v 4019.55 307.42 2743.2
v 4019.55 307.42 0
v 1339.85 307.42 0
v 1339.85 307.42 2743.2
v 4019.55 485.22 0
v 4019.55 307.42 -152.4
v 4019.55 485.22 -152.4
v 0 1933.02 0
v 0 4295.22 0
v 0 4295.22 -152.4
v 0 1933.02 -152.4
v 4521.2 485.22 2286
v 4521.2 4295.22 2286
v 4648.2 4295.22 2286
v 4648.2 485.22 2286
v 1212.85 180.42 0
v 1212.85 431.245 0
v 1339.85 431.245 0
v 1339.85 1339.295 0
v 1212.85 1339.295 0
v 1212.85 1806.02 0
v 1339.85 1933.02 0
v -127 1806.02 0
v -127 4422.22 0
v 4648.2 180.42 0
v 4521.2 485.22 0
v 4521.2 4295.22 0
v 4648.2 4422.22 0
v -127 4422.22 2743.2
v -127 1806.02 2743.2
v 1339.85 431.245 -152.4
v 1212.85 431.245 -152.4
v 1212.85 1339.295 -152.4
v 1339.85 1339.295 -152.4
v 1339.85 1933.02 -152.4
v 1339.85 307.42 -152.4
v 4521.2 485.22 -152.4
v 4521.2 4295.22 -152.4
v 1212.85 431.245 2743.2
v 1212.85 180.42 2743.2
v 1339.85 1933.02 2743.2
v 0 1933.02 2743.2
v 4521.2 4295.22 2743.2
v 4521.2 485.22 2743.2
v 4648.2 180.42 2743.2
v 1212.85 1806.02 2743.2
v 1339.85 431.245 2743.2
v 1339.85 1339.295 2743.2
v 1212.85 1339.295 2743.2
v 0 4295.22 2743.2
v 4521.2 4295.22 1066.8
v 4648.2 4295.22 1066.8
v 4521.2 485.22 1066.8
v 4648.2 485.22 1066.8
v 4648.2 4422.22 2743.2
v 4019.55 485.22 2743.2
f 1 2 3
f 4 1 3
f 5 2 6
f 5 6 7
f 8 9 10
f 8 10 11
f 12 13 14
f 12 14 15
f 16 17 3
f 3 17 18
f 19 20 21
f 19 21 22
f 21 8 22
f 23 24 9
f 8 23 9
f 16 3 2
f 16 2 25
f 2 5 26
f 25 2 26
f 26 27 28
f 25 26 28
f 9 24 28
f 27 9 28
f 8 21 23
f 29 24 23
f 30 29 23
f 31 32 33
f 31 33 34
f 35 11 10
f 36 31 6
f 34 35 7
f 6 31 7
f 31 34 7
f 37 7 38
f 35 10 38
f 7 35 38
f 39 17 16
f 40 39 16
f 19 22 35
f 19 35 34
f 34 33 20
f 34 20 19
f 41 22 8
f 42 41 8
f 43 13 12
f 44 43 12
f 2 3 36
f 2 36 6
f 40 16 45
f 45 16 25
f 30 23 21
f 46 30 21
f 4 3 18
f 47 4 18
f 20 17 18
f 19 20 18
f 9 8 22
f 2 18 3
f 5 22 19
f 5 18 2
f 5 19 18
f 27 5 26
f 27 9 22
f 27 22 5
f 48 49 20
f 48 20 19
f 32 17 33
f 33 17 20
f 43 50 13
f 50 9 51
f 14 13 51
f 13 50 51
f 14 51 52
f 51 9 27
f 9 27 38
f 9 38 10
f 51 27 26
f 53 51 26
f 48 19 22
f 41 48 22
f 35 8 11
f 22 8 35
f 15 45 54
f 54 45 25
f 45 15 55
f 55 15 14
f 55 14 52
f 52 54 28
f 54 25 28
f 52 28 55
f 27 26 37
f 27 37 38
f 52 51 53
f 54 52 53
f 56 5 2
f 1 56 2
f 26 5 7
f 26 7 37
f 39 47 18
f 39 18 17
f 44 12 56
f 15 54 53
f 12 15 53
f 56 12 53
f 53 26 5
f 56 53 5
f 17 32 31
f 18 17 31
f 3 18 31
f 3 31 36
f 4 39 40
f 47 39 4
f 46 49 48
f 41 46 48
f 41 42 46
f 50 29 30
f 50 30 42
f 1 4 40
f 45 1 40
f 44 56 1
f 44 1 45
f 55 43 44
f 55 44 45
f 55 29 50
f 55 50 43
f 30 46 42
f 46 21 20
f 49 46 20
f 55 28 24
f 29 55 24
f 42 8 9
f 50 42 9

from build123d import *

# Parameters (mm, degrees)
F1_DEPTH = 2743.2
F2_W     = 3810
F2_H     = 1219.2
F3_DEPTH = 127
F0_W     = 127
F0_H     = 908.05
F4_DEPTH = 152.4


with BuildPart() as f1:
    # F0 (on Top) → F1 (new body)
    with BuildSketch(Plane.XY):
        Polygon((4019.55, 307.420327), (1339.85, 307.420327), (1339.85, 431.245327), (1212.85, 431.245327), (1212.85, 180.420327), (4648.2, 180.420327), (4648.2, 4422.220327), (-127, 4422.220327), (-127, 1806.020327), (1212.85, 1806.020327), (1212.85, 1339.295327), (1339.85, 1339.295327), (1339.85, 1933.020327), (0, 1933.020327), (0, 4295.220327), (4521.2, 4295.220327), (4521.2, 485.220327), (4019.55, 485.220327), align=None)
    extrude(amount=F1_DEPTH)

    # F2 (on face) → F3 (cut, through all)
    with BuildSketch(Plane(origin=(4521.2, 0, 0), x_dir=(0, -1, 0), z_dir=(-1, 0, 0))):
        with Locations((-2390.220327, 1676.4)):
            Rectangle(F2_W, F2_H)
    extrude(amount=-F3_DEPTH, mode=Mode.SUBTRACT)

    # F0 (on Top) → F4 (join)
    with BuildSketch(Plane.XY):
        Polygon((1339.85, 431.245327), (1339.85, 307.420327), (4019.55, 307.420327), (4019.55, 485.220327), (4521.2, 485.220327), (4521.2, 4295.220327), (0, 4295.220327), (0, 1933.020327), (1339.85, 1933.020327), (1339.85, 1339.295327), align=None)
        with Locations((1276.35, 885.270327)):
            Rectangle(F0_W, F0_H)
    extrude(amount=-F4_DEPTH)


solid = f1.part
